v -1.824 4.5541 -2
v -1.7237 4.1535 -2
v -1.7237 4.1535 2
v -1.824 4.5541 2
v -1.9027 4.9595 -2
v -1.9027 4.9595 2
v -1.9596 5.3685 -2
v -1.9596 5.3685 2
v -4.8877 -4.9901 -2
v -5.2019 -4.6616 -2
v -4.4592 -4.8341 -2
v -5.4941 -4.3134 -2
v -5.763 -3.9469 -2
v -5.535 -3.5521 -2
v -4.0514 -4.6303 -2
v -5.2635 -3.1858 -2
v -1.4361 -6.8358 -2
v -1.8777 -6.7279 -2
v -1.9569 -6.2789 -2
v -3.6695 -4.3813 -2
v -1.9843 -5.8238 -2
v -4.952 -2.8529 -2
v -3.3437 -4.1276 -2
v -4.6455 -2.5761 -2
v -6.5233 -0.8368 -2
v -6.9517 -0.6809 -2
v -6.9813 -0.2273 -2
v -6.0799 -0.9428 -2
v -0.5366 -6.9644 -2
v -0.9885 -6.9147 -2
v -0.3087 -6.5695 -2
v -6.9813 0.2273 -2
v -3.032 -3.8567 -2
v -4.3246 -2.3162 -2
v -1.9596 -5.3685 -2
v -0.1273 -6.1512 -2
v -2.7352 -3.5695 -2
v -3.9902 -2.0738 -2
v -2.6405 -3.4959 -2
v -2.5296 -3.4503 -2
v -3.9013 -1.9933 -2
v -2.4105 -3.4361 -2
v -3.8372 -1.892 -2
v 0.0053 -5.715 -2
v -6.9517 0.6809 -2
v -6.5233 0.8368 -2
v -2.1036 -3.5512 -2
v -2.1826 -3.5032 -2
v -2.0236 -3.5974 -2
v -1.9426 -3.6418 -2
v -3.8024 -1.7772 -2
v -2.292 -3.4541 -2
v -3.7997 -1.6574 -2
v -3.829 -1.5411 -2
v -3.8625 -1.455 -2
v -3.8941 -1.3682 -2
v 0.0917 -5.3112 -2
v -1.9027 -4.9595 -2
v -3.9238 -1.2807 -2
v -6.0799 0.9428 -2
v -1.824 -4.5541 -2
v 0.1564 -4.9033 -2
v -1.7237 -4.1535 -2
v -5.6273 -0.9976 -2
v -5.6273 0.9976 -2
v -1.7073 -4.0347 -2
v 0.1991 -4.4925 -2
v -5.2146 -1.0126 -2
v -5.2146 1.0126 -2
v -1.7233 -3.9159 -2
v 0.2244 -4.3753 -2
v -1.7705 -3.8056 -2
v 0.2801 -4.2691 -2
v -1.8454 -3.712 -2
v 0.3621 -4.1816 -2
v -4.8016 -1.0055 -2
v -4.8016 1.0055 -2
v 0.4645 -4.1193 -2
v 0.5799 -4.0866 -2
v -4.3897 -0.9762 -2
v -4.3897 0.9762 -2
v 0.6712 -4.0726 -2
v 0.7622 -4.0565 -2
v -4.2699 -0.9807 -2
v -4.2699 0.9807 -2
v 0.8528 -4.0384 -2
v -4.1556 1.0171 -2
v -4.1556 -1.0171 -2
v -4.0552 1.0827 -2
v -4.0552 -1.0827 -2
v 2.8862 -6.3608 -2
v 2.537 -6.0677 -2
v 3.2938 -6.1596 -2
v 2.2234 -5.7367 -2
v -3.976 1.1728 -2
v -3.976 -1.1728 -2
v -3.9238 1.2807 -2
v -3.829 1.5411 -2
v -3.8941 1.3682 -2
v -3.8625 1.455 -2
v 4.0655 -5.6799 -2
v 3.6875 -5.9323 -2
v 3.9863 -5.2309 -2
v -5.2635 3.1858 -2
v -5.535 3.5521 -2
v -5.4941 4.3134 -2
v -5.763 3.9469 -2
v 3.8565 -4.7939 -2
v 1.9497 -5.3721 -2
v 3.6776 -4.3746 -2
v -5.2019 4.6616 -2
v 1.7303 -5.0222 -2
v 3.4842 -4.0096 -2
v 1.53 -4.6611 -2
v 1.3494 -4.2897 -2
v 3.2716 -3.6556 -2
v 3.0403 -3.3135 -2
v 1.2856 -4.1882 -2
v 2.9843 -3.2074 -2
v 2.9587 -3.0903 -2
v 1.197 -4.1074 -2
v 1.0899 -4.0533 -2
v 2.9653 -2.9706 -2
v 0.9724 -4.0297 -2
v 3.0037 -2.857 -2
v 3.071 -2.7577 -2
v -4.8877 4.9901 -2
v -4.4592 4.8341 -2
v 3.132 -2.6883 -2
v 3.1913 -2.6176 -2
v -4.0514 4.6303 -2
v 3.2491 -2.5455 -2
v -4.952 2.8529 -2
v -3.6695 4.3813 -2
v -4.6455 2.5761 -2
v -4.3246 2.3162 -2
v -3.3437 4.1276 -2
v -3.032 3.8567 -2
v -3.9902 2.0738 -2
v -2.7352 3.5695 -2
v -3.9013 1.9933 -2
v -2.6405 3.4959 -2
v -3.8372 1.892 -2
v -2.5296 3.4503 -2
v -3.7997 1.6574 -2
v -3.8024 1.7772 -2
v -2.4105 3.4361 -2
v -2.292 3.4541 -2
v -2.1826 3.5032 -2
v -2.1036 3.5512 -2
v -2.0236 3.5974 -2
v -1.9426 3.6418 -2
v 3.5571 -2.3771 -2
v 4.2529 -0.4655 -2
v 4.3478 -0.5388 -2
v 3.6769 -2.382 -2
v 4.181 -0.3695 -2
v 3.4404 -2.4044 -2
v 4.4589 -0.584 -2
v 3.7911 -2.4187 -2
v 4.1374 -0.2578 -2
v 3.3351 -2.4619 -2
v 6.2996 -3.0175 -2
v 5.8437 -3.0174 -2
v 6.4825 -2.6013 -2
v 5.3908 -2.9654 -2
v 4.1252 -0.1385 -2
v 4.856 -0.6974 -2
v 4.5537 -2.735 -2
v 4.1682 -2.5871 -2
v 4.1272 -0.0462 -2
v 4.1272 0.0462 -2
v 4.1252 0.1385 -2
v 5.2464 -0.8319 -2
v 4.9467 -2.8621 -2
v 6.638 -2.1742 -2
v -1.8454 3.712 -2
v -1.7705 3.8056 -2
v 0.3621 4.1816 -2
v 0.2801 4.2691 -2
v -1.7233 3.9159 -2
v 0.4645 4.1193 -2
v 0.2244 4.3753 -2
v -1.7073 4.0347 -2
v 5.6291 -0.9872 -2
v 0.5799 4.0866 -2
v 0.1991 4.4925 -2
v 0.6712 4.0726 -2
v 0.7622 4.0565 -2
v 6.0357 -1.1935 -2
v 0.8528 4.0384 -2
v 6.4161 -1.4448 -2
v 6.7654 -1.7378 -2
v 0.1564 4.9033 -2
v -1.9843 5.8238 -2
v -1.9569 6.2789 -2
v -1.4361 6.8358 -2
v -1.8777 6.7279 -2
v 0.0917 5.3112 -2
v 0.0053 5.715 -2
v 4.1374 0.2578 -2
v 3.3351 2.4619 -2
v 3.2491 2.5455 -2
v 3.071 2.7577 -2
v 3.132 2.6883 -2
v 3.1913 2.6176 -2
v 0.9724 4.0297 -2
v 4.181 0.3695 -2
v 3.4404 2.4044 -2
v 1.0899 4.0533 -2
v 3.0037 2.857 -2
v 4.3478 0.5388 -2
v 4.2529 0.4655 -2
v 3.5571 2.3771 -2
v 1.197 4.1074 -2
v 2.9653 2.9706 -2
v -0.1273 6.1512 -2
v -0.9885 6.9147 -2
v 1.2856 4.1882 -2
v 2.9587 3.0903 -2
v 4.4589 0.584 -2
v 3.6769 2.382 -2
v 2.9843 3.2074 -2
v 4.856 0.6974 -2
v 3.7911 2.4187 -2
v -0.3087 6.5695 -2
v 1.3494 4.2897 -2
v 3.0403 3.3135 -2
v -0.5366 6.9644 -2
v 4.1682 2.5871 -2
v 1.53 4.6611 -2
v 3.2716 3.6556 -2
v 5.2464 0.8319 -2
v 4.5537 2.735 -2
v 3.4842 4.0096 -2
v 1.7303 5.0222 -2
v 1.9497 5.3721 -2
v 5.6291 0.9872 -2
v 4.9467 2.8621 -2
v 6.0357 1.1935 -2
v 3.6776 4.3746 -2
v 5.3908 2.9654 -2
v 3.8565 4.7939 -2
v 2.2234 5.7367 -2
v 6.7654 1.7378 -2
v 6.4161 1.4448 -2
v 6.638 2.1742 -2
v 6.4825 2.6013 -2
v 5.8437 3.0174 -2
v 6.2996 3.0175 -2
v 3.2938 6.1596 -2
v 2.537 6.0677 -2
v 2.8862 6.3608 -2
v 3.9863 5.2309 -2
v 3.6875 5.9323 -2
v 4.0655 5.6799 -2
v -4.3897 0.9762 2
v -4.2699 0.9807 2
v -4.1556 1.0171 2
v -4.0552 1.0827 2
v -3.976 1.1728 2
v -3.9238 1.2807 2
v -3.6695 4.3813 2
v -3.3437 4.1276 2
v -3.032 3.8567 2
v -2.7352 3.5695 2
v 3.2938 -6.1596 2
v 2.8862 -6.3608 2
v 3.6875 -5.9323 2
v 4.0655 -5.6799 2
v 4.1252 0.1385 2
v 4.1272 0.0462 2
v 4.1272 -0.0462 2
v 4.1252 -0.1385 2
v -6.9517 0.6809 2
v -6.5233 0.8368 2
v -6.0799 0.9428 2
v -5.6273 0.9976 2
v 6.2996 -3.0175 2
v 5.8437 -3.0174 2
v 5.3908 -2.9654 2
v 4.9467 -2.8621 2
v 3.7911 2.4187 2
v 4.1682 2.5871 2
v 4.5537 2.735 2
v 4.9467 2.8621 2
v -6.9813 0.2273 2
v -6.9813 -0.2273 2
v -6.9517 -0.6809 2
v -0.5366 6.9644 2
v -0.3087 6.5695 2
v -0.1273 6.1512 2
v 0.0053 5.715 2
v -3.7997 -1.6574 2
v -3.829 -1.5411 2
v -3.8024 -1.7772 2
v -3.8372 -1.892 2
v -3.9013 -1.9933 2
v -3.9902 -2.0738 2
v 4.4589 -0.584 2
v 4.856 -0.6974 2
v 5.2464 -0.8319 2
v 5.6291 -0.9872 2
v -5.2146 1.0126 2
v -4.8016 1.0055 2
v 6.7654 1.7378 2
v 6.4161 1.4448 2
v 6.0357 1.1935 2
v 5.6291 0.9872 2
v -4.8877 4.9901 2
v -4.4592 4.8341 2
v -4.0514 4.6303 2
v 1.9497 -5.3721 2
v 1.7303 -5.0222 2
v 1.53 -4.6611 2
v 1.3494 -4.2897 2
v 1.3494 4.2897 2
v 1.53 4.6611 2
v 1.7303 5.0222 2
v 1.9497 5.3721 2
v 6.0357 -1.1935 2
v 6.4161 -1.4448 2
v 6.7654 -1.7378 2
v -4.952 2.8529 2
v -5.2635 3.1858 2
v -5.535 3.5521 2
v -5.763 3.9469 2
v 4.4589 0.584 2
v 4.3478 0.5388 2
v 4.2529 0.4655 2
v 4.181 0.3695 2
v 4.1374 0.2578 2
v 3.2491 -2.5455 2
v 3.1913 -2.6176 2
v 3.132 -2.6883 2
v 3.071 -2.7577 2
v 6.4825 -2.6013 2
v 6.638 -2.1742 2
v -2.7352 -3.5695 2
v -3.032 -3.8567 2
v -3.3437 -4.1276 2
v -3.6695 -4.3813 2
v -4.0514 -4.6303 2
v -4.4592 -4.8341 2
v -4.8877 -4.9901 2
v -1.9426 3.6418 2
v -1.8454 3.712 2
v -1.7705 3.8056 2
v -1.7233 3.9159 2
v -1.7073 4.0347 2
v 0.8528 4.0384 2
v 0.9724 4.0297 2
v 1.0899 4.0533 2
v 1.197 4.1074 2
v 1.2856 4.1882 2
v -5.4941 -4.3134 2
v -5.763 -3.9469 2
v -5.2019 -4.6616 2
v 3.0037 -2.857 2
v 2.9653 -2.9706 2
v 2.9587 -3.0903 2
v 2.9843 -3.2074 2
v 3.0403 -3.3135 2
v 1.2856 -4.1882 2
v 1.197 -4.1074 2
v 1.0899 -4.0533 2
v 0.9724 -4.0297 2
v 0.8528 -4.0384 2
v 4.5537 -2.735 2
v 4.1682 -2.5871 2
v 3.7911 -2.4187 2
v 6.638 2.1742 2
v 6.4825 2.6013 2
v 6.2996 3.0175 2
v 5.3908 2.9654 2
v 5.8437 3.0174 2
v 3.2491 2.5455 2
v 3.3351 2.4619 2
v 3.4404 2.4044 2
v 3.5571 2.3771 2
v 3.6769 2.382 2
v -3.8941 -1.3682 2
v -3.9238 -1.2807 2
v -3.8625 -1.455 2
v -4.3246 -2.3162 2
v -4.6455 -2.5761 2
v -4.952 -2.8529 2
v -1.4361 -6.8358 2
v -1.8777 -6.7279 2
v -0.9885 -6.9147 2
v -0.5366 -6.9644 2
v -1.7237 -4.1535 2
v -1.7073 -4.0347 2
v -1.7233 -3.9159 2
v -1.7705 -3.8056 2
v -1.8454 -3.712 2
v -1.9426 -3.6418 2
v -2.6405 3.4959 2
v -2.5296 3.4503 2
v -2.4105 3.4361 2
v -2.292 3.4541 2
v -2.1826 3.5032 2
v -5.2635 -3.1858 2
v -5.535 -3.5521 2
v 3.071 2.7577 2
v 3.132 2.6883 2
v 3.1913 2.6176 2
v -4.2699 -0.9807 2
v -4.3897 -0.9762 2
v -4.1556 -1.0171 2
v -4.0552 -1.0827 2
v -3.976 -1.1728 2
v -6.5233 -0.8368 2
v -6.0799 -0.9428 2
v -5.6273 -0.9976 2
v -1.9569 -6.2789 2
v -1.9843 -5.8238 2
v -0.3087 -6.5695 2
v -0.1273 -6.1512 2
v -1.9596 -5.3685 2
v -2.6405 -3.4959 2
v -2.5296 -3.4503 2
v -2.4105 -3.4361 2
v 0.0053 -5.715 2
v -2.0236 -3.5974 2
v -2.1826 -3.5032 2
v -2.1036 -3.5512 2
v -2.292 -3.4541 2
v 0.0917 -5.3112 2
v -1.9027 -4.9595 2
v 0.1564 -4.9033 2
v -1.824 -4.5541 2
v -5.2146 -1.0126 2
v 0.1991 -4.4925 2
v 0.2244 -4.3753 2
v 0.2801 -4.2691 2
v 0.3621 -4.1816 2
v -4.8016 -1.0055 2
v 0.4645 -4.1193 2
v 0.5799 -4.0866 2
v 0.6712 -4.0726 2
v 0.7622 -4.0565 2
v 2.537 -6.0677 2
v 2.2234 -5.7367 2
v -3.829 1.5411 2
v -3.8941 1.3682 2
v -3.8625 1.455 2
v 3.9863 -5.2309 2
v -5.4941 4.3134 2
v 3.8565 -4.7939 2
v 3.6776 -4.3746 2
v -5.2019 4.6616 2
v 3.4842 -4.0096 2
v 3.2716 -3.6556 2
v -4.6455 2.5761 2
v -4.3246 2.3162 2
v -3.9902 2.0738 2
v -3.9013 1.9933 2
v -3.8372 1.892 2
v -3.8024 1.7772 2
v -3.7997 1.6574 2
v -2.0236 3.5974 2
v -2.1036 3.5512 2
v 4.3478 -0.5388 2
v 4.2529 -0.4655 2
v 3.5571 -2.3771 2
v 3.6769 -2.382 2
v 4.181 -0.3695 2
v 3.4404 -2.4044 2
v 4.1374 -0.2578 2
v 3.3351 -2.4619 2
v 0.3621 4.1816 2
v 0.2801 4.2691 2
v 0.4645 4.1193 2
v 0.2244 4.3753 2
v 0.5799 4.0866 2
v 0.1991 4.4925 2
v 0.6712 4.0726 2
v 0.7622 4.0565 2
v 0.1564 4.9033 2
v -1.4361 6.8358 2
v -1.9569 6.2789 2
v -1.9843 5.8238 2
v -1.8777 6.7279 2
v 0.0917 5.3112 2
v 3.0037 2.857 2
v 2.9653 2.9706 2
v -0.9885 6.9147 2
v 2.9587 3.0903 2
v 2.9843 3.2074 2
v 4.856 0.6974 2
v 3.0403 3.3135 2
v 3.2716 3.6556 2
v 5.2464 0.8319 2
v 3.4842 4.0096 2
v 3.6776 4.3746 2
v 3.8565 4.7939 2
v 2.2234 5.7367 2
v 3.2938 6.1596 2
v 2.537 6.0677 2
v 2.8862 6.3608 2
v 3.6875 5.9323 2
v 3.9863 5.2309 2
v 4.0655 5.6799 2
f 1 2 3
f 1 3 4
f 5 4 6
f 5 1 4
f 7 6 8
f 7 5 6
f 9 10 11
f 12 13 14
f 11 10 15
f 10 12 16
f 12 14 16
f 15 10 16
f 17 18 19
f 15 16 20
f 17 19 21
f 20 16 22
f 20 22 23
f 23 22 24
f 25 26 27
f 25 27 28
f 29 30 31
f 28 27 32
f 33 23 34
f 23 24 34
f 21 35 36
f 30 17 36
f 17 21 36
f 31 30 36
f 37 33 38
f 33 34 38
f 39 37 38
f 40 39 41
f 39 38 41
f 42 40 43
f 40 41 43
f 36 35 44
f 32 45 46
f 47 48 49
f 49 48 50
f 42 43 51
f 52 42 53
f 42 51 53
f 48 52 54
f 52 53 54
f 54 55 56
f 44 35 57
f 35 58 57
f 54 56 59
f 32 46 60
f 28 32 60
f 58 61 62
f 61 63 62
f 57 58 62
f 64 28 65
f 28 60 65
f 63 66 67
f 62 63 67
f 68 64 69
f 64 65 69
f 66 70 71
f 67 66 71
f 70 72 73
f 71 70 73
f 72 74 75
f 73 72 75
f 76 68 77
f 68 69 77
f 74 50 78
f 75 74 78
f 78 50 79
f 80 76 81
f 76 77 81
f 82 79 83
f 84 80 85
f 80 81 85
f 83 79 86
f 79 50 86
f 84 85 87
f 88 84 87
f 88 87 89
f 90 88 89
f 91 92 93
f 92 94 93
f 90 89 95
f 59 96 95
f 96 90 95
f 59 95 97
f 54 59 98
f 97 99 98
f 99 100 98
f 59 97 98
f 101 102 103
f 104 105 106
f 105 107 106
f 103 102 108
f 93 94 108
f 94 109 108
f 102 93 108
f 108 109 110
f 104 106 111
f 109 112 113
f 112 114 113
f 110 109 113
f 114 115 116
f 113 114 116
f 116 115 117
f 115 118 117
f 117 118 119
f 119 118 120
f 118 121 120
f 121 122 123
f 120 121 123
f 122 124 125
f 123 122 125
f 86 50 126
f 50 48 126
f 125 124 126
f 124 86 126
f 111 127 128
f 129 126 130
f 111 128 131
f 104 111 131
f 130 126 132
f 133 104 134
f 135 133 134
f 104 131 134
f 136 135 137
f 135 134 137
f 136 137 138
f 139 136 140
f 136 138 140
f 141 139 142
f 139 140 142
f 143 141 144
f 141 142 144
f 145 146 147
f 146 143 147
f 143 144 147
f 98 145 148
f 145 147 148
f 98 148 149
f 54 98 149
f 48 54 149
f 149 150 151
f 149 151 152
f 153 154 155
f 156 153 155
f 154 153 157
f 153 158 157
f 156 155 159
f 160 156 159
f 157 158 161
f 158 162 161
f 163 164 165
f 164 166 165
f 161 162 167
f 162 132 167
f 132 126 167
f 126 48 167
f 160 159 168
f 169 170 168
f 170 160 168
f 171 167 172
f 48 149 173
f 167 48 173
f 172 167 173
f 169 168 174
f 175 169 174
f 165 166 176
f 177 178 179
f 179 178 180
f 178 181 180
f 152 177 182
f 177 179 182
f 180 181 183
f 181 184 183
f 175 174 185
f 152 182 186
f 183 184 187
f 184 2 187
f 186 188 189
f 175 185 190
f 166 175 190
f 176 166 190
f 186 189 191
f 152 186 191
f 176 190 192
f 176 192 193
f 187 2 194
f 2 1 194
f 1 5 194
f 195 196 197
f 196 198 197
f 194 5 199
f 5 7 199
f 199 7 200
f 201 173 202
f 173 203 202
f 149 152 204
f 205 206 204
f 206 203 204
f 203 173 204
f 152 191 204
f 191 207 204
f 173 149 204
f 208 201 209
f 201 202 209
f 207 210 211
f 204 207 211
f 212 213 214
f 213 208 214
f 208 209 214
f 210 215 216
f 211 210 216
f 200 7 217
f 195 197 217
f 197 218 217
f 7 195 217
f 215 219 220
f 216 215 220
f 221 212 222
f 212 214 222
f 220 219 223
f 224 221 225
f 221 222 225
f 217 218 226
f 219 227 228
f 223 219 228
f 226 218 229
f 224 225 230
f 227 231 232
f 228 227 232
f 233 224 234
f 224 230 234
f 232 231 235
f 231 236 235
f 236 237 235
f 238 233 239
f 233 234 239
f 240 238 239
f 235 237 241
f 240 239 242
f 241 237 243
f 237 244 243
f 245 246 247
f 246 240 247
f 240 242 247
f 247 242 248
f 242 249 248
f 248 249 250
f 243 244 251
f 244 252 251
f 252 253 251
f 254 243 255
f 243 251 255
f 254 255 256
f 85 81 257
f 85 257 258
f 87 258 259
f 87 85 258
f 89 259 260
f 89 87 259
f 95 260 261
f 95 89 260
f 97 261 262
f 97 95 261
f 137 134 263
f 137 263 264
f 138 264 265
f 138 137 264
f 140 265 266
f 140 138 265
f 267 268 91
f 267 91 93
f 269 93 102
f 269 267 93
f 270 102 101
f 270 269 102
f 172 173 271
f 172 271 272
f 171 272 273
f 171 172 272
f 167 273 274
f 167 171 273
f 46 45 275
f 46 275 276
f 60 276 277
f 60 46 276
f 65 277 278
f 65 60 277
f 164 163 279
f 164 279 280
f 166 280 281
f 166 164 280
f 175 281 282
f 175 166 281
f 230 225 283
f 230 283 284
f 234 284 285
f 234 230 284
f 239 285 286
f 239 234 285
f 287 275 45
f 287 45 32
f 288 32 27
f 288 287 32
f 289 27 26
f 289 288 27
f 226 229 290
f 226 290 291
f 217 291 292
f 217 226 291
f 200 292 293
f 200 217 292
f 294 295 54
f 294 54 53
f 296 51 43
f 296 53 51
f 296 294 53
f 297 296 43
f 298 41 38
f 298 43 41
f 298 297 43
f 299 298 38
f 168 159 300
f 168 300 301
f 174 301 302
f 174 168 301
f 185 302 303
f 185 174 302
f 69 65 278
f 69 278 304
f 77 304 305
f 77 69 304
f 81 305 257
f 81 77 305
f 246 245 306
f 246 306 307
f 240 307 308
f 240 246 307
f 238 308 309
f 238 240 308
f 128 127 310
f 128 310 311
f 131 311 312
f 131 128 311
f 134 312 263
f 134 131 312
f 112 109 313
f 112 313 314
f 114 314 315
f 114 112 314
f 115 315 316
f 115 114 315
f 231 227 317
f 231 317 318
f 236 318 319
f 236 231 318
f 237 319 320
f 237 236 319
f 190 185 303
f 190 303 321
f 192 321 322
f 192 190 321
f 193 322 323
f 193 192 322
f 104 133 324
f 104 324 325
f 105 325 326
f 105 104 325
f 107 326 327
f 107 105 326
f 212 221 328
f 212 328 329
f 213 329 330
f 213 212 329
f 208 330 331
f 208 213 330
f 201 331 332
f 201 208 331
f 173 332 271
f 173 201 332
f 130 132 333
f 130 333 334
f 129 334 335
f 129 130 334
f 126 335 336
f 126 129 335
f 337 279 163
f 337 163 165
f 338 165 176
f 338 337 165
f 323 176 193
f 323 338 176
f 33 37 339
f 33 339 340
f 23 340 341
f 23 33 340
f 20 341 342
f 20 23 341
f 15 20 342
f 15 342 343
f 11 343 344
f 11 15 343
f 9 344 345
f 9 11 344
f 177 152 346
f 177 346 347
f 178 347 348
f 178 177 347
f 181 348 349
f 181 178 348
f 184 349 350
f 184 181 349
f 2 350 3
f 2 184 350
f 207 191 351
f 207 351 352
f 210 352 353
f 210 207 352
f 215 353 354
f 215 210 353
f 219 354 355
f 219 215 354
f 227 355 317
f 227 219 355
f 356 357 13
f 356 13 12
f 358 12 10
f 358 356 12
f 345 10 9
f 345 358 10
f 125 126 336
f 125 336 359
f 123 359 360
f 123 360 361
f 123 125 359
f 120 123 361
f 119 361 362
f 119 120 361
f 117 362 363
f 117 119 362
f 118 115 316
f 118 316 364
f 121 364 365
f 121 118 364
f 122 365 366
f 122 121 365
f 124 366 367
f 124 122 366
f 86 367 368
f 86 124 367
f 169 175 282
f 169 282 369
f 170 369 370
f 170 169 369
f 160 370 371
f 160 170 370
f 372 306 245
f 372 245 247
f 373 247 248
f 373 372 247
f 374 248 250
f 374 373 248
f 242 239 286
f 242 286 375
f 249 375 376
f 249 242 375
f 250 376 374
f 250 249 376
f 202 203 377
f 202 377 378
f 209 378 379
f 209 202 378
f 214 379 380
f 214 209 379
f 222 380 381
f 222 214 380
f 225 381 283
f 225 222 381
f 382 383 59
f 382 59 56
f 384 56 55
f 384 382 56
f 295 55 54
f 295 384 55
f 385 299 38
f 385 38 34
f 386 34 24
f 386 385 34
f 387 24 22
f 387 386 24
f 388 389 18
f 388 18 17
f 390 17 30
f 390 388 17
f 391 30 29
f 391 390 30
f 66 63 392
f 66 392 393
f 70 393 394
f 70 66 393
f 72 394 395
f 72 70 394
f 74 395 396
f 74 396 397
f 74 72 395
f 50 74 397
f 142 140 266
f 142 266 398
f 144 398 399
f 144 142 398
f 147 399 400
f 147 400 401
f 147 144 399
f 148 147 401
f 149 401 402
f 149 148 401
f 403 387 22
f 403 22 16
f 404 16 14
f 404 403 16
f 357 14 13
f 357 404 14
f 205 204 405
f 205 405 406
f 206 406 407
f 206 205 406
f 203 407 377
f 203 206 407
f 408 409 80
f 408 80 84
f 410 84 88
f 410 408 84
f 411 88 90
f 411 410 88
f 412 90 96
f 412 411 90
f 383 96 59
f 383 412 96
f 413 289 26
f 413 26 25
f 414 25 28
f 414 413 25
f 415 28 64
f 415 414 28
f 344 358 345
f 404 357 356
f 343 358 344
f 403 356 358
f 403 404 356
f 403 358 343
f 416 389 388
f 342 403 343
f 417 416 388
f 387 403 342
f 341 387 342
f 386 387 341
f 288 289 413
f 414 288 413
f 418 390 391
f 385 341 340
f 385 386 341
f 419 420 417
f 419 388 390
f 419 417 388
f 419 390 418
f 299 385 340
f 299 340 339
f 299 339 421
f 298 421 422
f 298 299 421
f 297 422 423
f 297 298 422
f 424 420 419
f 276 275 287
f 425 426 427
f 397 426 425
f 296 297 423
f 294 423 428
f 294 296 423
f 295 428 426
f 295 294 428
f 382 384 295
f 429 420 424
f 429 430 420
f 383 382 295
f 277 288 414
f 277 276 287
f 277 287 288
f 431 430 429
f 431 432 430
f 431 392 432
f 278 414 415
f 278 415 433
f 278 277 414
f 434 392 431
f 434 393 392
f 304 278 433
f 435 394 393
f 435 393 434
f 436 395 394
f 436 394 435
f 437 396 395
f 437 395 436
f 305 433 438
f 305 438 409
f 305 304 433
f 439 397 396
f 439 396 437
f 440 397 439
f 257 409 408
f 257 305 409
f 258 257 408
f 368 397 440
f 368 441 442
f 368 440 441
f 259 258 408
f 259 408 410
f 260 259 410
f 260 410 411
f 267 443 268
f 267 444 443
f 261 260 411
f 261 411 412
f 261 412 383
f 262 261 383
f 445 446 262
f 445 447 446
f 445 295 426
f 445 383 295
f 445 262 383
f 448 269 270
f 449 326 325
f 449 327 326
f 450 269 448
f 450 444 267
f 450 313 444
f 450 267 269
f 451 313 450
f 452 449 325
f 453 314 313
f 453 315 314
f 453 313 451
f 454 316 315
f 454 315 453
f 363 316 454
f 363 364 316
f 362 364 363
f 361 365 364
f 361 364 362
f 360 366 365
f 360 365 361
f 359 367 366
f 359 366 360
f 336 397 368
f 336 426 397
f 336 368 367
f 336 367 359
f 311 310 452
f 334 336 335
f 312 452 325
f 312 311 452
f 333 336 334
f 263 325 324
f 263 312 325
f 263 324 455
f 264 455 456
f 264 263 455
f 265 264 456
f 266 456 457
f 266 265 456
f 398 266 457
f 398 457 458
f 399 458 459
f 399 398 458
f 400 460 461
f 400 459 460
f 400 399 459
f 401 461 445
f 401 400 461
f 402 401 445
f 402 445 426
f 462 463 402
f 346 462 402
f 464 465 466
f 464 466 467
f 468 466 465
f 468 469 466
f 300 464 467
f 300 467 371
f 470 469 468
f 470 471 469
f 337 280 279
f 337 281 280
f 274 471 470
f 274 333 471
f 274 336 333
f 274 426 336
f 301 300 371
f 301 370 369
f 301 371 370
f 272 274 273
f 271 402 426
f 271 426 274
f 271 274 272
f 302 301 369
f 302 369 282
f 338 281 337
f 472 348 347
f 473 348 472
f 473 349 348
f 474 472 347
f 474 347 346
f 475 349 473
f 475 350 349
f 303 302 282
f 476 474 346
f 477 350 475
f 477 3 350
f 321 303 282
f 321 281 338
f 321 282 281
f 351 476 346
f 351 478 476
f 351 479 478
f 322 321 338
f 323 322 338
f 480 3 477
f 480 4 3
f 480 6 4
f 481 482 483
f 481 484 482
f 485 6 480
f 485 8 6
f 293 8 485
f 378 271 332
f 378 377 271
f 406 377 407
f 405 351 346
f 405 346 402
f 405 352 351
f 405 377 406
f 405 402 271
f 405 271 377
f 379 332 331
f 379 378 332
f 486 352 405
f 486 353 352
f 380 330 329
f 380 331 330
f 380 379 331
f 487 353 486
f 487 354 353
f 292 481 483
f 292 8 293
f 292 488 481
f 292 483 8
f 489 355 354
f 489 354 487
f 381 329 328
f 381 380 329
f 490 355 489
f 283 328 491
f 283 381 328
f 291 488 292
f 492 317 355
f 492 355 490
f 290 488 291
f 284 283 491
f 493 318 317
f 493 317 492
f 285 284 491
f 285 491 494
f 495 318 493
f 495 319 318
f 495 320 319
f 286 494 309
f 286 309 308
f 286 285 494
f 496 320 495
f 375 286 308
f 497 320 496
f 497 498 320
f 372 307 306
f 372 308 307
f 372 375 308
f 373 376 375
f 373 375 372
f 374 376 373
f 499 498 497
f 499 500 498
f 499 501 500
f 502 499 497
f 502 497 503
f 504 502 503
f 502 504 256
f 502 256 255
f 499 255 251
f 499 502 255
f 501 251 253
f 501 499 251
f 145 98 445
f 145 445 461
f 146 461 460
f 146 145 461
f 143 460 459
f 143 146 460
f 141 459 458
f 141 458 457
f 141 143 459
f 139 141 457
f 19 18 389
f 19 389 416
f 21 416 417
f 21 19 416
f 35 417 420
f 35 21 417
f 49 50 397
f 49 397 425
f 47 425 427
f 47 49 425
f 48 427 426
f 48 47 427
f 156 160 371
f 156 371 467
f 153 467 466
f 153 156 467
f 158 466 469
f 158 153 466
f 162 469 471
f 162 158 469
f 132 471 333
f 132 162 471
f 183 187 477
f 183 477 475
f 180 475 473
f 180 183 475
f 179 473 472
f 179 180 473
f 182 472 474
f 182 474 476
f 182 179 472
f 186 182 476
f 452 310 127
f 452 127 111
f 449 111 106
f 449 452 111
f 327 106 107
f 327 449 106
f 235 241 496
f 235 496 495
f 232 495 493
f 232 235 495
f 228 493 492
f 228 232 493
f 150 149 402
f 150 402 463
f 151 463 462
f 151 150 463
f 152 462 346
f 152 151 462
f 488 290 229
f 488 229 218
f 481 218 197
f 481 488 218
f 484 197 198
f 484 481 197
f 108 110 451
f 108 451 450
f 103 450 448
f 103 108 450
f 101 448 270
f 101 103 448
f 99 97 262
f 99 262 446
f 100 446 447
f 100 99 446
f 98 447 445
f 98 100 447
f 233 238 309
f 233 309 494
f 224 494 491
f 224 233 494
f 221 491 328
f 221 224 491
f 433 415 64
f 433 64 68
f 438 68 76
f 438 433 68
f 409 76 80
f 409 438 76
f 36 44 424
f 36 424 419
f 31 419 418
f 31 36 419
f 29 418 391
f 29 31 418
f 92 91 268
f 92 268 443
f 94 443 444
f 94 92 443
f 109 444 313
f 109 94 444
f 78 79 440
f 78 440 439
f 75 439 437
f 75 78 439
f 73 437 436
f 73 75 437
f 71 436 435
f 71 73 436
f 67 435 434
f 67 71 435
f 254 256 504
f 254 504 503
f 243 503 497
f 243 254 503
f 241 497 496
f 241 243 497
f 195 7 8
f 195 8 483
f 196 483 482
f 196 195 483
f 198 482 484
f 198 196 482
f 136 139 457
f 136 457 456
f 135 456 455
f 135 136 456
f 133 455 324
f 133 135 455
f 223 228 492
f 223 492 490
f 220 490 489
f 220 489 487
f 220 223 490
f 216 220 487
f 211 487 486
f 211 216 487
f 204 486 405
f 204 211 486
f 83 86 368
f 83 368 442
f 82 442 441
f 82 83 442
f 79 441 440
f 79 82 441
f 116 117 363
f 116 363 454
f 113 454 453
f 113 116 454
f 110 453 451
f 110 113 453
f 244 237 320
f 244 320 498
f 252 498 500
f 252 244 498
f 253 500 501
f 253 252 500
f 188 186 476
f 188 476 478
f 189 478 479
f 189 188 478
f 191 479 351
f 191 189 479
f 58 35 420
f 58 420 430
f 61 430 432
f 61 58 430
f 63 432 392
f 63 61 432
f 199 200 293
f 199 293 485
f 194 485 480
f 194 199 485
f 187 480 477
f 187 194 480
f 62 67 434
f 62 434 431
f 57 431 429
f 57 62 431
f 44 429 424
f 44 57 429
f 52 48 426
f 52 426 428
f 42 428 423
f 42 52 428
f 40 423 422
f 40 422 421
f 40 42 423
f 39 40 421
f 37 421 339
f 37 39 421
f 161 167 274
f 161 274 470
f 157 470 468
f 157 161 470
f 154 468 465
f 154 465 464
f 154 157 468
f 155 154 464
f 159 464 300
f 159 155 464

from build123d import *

# Parameters (mm, degrees)
SKETCH1_R                = 6.985
BLANK_DISK_DEPTH         = 2.000000064
GEAR_TOOTH_CUT_DEPTH     = 11.657412961
GEAR_TEETH_REVOLVE_COUNT = 9


with BuildPart() as part:
    # Sketch1 → BLANK DISK (new, symmetric)
    with BuildSketch(Plane.XY):
        Circle(SKETCH1_R)
    extrude(amount=BLANK_DISK_DEPTH, both=True)

    # Sketch2 → GEAR TOOTH CUT (cut, through all)
    with BuildSketch(Plane.XY.offset(2.000000064)):
        with BuildLine():
            ThreePointArc((-5.763009467, -3.946890786), (-6.563752956, -2.389010701), (-6.951733872, -0.680897326))
            ThreePointArc((-6.951733872, -0.680897326), (-6.303106227, -0.89616004), (-5.627259472, -0.997585))
            ThreePointArc((-5.627259472, -0.997585), (-5.00805343, -1.01182167), (-4.389706578, -0.976241119))
            ThreePointArc((-4.389706578, -0.976241119), (-4.103194142, -1.046520353), (-3.923782009, -1.280699416))
            ThreePointArc((-3.923782009, -1.280699416), (-3.878581292, -1.411688142), (-3.82900912, -1.541085788))
            ThreePointArc((-3.82900912, -1.541085788), (-3.815919388, -1.835801253), (-3.990226026, -2.073804914))
            ThreePointArc((-3.990226026, -2.073804914), (-4.486777934, -2.444014326), (-4.951966126, -2.852938219))
            ThreePointArc((-4.951966126, -2.852938219), (-5.404500069, -3.365060167), (-5.763009467, -3.946890786))
        make_face()
    gear_tooth_cut = extrude(amount=-GEAR_TOOTH_CUT_DEPTH, mode=Mode.SUBTRACT)

    # GEAR TEETH REVOLVE: GEAR TOOTH CUT ×9 about axis
    gear_teeth_revolve_axis = Axis((0, 0, 50), (0, 0, -1))
    for i in range(1, GEAR_TEETH_REVOLVE_COUNT):
        add(gear_tooth_cut.rotate(gear_teeth_revolve_axis, i * 360 / GEAR_TEETH_REVOLVE_COUNT), mode=Mode.SUBTRACT)


solid = part.part
